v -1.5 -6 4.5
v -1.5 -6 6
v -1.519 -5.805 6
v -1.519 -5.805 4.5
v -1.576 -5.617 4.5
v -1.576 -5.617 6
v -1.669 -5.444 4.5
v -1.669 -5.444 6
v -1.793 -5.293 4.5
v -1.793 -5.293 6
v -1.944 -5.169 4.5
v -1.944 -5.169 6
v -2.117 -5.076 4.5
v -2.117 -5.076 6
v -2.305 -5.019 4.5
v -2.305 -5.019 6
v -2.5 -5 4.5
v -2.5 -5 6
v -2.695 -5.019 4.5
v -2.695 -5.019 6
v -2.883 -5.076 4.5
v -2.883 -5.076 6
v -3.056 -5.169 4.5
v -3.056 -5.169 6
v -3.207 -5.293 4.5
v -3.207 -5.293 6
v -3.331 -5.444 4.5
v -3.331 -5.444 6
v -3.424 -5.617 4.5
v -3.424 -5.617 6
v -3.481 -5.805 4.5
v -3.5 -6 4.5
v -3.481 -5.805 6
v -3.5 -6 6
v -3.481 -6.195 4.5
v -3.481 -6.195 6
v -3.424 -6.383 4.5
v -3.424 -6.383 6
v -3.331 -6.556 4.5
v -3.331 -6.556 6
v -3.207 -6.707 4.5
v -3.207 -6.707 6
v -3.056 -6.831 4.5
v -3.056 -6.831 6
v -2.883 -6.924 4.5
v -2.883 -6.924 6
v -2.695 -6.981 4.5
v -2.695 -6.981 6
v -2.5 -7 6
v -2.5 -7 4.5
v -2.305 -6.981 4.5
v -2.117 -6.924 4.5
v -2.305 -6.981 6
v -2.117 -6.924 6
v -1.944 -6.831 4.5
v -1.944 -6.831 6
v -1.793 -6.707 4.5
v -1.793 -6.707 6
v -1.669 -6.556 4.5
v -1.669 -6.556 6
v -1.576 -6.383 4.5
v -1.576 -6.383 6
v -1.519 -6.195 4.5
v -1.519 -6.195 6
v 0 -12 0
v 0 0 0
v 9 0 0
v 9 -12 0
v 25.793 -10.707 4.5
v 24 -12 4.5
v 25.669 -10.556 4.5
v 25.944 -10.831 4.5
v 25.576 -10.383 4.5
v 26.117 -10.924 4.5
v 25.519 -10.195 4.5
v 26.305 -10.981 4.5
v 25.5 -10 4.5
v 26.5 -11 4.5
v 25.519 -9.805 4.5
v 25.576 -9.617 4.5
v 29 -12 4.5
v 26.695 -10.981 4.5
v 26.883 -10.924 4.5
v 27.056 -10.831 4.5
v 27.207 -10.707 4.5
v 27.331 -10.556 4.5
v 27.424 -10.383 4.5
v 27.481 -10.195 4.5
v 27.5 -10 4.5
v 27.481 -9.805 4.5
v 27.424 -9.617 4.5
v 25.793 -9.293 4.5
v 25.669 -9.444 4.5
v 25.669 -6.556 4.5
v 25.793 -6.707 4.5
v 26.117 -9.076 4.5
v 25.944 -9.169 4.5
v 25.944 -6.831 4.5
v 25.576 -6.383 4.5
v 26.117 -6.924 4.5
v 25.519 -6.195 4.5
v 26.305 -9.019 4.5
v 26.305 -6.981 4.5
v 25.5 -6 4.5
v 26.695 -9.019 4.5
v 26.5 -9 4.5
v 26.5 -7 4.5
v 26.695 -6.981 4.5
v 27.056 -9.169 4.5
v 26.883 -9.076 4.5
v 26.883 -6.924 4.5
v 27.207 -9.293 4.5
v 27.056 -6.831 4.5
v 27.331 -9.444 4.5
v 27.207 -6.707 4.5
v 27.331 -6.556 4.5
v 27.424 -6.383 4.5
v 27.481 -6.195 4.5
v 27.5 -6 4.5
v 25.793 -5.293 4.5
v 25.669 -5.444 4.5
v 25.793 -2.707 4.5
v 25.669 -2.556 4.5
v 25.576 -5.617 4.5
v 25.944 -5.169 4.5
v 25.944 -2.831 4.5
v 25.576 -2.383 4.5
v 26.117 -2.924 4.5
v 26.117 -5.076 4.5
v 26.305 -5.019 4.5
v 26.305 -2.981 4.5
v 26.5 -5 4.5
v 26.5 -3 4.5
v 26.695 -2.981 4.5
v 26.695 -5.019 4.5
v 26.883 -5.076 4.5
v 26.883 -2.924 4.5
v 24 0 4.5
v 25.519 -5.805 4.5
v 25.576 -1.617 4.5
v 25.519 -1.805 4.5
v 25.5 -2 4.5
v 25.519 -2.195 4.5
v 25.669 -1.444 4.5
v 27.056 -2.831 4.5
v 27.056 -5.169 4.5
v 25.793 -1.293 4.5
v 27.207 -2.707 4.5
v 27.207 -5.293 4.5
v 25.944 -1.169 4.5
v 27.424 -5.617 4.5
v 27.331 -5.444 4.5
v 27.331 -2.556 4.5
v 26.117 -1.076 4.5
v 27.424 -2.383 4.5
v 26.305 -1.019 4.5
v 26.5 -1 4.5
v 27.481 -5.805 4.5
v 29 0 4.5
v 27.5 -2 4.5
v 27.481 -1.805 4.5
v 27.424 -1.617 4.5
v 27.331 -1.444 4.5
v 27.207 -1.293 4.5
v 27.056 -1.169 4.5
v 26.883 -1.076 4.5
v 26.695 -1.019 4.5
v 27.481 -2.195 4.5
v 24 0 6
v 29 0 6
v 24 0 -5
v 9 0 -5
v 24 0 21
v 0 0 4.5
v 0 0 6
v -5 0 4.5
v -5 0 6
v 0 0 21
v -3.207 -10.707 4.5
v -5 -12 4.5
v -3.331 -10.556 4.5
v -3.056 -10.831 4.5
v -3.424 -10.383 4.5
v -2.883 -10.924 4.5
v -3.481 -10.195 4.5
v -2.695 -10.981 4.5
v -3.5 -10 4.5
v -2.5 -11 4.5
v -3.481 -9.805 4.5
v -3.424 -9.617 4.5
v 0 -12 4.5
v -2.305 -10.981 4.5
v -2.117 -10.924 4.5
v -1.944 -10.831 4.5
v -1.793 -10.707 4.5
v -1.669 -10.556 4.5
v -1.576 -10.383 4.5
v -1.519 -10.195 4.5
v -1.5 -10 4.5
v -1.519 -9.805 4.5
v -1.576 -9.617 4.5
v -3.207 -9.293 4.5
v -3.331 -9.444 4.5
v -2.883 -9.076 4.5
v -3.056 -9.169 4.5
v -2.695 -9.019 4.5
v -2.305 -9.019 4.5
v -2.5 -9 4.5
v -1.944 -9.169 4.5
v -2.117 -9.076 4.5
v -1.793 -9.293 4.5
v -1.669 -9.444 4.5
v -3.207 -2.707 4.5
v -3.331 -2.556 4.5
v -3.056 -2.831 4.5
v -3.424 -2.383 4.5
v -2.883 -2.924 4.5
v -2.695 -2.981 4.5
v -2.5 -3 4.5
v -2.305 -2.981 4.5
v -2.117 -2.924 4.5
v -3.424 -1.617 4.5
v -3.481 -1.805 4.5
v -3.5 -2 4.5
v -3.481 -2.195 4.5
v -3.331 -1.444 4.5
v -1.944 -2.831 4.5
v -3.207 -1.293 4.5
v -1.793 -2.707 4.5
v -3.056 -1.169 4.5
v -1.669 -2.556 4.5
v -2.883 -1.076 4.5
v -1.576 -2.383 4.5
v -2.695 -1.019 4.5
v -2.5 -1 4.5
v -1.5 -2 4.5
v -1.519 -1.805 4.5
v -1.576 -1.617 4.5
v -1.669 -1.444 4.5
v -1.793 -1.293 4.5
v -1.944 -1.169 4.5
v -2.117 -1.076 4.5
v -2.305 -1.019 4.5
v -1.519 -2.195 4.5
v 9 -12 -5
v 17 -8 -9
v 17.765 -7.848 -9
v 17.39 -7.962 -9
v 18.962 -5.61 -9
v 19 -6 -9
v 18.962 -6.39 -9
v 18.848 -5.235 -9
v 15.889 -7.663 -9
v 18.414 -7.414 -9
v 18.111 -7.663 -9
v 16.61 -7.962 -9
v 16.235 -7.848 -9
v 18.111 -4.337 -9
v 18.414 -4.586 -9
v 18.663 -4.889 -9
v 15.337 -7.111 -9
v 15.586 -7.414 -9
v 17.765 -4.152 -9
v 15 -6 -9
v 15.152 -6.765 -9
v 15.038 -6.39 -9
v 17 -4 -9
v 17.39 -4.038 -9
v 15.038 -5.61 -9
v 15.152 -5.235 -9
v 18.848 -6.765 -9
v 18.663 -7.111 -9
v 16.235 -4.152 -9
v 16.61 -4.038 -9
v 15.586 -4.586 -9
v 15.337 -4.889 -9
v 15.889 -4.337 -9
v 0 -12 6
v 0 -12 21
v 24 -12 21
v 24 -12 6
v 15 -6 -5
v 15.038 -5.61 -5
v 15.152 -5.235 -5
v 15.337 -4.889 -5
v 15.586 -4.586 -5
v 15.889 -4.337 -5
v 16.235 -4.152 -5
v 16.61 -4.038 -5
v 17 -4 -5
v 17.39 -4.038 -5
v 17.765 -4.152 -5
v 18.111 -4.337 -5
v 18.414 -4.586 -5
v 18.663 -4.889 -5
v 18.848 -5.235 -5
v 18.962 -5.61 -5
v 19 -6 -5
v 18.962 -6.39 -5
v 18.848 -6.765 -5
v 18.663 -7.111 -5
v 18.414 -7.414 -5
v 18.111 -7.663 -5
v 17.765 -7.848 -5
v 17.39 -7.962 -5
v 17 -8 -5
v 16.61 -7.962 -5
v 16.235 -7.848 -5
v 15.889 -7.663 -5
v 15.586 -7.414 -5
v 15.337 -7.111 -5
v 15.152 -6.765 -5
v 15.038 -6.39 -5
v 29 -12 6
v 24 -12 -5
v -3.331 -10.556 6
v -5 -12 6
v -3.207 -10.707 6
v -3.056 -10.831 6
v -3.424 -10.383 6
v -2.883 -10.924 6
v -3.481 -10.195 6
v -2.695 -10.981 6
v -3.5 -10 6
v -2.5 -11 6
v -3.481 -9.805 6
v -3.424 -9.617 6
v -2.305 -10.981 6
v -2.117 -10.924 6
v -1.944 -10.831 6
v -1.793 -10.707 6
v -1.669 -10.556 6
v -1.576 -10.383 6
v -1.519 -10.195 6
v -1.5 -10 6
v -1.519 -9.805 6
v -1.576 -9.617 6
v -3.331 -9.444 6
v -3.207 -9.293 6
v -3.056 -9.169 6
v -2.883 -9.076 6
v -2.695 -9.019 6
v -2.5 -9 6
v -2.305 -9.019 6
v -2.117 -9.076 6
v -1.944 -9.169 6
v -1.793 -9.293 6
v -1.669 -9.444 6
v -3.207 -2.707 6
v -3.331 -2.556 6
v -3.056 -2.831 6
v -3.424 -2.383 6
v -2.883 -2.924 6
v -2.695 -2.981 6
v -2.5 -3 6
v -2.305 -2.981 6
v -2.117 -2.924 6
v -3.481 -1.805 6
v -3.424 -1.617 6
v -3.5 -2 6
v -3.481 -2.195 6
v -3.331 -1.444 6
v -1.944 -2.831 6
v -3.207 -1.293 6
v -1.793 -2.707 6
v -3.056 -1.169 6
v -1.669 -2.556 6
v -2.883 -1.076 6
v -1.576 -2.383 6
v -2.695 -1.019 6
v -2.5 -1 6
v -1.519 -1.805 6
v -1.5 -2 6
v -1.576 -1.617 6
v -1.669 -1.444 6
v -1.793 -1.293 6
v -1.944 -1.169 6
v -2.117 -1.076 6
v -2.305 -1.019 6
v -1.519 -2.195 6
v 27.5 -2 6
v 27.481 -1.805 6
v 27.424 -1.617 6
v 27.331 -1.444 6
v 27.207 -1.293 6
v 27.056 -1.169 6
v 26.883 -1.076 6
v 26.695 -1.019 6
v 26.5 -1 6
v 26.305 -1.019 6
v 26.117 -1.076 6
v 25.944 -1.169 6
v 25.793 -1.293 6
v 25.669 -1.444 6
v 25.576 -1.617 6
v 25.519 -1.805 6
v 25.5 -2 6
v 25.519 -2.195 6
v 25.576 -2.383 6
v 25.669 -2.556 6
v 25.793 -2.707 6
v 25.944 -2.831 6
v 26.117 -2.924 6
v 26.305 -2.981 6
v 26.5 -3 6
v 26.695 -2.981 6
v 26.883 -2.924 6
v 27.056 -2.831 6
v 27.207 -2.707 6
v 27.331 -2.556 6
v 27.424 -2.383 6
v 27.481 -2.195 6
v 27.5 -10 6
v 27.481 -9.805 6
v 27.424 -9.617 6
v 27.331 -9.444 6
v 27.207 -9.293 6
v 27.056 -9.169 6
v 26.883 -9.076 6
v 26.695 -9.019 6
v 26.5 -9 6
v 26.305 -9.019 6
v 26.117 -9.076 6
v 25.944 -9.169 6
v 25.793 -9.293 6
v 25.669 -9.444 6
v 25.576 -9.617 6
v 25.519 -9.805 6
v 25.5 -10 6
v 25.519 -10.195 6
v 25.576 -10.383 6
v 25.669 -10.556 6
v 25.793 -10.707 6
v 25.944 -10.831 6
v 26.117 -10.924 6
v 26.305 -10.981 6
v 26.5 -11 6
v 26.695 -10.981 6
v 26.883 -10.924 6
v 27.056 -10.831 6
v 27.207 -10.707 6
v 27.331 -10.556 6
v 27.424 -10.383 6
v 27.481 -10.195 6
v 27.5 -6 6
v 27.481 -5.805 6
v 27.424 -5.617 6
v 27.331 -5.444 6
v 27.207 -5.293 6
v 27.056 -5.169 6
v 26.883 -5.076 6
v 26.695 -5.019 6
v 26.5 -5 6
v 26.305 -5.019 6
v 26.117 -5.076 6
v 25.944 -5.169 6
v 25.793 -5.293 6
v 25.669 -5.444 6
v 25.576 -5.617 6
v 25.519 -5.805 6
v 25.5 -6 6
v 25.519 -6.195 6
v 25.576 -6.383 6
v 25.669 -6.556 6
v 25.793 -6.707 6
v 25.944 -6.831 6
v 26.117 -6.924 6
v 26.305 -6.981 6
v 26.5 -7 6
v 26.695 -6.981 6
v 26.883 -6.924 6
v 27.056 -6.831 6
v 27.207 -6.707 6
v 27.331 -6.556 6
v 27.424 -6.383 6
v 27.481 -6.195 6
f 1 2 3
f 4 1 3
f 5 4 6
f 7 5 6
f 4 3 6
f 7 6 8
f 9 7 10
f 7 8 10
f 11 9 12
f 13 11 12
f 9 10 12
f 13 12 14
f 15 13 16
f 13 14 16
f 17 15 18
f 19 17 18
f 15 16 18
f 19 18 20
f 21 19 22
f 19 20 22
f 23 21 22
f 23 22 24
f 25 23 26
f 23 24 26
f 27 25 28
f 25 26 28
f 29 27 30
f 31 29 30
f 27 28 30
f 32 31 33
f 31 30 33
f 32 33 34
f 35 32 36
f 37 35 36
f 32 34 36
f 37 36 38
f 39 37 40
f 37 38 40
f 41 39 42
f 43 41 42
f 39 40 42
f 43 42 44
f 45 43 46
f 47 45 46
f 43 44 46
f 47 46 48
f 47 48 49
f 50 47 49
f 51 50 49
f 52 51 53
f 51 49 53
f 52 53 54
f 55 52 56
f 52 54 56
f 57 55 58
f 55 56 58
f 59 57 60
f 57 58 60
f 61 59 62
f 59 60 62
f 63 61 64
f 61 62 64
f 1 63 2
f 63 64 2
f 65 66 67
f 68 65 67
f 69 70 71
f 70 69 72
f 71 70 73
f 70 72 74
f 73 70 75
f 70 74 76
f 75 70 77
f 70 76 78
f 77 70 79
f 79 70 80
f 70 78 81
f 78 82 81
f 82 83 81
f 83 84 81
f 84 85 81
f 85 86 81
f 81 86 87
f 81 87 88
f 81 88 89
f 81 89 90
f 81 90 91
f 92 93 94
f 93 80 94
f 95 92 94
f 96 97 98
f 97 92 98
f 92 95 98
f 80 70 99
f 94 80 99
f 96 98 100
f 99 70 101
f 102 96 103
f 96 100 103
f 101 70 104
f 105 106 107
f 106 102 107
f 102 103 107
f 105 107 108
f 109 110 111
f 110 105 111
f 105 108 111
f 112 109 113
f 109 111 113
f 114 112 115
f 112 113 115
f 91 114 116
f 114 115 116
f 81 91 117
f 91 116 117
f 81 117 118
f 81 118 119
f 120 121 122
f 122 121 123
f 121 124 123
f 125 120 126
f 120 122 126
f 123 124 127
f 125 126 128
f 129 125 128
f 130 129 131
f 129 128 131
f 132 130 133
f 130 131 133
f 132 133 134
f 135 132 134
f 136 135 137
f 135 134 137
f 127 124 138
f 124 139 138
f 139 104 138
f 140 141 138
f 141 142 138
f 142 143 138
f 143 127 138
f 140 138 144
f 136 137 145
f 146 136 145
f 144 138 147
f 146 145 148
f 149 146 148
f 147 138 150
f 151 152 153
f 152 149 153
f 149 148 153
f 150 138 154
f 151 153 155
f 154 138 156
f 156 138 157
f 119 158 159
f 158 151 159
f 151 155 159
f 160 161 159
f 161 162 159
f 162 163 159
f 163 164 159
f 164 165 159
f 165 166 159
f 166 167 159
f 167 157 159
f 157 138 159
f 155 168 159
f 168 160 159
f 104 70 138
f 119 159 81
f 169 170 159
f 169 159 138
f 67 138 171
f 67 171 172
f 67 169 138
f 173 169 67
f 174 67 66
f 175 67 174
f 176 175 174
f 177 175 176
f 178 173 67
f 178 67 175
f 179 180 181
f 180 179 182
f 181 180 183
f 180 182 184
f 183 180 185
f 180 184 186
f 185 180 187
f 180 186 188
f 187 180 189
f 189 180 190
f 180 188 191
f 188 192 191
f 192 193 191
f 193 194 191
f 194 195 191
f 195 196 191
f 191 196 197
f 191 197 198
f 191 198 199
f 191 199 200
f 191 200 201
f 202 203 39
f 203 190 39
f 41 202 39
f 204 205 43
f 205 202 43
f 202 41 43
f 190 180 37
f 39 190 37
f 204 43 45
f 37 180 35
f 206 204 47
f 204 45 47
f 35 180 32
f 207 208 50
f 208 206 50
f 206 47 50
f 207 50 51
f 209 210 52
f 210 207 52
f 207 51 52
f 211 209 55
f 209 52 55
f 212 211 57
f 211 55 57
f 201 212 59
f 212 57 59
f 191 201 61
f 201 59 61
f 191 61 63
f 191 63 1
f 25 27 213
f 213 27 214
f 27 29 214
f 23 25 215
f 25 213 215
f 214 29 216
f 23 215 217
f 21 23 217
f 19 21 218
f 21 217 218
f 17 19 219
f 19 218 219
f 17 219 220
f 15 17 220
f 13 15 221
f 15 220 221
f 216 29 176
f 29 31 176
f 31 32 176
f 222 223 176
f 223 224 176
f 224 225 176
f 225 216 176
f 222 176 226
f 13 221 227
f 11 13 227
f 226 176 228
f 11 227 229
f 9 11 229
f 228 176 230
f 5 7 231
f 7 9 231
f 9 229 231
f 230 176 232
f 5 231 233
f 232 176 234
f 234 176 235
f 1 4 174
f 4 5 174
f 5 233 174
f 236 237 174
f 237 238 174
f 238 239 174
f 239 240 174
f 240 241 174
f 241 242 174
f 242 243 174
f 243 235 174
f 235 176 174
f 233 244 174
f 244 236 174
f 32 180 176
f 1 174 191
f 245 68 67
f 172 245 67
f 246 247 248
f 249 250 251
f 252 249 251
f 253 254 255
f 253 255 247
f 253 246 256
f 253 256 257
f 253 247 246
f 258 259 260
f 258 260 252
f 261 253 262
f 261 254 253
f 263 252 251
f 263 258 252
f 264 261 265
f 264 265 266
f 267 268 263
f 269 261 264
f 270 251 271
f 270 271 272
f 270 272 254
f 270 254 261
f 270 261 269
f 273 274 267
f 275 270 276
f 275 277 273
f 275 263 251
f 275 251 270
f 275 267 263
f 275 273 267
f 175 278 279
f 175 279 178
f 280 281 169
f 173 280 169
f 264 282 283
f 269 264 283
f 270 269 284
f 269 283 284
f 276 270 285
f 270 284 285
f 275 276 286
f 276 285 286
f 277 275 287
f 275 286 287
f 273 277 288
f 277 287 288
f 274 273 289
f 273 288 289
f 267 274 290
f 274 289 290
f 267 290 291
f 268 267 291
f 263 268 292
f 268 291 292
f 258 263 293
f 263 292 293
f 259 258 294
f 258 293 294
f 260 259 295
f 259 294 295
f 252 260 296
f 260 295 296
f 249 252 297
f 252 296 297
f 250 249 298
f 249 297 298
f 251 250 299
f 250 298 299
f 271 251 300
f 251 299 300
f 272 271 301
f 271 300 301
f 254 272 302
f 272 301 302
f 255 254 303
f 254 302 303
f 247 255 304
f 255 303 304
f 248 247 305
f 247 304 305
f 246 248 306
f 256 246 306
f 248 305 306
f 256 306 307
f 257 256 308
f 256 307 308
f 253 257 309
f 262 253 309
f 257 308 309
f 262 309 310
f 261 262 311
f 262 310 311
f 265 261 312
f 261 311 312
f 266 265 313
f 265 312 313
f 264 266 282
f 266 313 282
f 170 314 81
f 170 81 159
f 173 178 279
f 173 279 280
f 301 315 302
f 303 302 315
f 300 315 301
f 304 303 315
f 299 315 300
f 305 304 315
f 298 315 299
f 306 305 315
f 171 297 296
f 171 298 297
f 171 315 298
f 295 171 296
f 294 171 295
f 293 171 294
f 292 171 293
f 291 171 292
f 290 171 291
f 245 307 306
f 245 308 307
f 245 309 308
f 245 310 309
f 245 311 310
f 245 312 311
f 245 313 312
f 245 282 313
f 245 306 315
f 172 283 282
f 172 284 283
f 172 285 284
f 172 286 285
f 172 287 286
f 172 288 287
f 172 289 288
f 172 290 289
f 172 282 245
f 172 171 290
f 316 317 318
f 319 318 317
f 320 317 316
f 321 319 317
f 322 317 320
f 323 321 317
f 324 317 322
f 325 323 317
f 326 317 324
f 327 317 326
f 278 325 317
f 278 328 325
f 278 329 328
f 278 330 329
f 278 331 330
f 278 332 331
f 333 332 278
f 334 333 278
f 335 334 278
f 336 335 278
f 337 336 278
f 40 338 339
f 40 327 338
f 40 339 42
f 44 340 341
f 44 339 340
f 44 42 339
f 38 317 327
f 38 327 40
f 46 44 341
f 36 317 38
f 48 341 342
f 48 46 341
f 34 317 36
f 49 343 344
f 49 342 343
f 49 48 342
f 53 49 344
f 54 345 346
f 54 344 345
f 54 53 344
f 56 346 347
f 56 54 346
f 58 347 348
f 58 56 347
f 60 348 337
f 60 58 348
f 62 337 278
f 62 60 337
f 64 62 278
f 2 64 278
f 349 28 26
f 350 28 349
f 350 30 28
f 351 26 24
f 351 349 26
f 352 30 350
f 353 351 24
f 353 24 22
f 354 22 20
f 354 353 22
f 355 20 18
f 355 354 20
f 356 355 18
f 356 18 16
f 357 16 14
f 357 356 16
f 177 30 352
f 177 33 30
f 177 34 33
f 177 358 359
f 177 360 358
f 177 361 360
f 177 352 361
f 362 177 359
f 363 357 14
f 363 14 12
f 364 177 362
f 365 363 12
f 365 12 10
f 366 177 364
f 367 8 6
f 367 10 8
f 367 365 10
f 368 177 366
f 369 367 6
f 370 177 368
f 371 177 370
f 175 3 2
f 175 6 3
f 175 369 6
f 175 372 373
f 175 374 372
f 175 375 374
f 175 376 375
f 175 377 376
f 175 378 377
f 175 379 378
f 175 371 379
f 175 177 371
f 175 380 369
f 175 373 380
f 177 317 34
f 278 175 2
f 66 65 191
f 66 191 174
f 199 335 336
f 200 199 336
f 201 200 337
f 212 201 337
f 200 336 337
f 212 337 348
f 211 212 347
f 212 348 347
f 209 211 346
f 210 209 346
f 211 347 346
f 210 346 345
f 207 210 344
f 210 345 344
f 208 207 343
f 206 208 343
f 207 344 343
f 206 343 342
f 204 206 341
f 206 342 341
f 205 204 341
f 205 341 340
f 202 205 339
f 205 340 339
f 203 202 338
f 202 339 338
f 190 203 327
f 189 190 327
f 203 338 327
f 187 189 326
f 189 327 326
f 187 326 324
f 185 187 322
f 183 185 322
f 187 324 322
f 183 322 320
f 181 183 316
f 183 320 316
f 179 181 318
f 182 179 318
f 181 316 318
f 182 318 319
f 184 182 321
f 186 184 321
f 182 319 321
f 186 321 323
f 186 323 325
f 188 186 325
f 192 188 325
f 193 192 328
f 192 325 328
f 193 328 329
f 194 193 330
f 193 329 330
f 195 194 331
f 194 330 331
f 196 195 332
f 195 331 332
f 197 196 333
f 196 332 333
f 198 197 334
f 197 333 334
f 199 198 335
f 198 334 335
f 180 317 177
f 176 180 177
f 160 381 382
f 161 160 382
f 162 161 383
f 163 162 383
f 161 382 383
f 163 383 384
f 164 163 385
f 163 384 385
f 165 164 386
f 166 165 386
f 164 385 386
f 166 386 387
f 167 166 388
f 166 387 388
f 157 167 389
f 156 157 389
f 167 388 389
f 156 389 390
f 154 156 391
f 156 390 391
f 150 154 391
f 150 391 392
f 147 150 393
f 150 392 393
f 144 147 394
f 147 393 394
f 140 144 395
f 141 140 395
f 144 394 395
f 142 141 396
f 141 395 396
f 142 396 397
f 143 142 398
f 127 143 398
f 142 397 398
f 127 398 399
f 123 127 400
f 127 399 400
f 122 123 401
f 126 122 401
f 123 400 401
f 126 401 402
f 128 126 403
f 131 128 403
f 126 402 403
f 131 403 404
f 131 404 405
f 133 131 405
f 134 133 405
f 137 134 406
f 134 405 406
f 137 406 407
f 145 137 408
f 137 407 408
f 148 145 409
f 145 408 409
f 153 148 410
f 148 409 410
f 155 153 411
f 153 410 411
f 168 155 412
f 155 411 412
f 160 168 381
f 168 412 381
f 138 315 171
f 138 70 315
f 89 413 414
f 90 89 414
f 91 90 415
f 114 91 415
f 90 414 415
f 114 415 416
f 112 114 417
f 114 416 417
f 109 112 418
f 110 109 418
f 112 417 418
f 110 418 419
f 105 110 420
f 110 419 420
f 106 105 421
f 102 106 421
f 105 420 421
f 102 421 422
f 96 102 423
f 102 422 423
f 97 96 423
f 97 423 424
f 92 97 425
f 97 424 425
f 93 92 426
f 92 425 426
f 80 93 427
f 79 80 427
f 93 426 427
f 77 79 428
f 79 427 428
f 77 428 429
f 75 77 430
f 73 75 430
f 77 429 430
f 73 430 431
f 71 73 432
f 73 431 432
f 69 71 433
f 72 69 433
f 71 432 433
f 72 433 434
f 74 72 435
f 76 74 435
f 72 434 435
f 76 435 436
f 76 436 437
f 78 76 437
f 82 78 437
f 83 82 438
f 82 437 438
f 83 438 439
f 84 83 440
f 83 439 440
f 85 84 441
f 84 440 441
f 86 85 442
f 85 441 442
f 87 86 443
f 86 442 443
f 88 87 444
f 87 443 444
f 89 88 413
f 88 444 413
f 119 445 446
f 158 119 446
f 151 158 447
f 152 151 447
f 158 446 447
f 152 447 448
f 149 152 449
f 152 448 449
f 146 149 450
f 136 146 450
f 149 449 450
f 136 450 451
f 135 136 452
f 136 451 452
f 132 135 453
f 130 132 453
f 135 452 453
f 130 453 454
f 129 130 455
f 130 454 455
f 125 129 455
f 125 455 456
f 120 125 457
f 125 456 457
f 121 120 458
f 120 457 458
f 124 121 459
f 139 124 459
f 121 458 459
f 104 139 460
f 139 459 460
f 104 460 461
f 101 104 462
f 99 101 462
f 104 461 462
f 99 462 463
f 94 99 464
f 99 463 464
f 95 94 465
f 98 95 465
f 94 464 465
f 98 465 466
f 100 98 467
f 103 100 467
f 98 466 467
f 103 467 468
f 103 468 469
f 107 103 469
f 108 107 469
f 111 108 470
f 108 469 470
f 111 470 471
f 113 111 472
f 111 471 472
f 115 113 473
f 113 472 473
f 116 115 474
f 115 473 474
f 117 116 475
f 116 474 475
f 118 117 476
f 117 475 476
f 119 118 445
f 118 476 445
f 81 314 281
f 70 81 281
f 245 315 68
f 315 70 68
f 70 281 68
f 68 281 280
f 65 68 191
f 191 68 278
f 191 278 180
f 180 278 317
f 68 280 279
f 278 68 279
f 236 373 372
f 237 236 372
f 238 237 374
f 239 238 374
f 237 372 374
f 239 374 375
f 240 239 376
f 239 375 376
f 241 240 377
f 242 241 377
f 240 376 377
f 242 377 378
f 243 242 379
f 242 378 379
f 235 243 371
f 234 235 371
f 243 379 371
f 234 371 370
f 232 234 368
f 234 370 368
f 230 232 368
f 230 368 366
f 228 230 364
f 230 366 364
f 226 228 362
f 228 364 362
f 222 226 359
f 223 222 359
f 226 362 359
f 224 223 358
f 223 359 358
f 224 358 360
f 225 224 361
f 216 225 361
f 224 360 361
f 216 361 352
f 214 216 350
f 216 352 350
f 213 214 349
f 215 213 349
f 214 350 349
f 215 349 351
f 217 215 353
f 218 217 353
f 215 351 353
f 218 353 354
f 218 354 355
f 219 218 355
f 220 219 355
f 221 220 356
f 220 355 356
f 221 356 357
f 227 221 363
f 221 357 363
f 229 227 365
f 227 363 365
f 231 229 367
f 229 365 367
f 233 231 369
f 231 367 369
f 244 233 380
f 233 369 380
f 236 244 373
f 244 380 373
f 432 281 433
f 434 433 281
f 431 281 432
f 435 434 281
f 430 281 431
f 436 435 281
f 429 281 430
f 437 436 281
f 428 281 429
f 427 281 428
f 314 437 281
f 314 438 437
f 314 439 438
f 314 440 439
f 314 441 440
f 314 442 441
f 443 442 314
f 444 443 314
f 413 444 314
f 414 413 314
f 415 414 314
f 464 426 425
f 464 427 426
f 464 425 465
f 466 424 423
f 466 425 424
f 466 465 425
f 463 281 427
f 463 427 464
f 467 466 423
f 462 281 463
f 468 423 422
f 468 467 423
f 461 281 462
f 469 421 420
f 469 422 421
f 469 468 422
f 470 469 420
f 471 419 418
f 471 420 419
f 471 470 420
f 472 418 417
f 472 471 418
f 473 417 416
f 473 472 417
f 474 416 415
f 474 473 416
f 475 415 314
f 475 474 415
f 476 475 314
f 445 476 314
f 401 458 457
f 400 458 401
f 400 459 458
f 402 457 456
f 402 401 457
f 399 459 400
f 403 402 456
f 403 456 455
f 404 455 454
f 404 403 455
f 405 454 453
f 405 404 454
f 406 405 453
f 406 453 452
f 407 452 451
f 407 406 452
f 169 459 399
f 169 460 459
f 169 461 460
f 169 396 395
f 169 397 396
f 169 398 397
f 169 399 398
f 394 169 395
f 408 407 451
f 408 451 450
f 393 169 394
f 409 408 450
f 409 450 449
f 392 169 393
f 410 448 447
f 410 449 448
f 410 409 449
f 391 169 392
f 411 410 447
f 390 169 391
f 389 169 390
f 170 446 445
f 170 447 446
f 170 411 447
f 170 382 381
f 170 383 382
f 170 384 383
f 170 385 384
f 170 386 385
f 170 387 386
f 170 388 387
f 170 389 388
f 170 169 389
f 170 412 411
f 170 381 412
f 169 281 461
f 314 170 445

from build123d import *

# Parameters (mm, degrees)
SKETCH1_W           = 24
SKETCH1_H           = 12
BOSS_EXTRUDE1_DEPTH = 21
SKETCH2_W           = 34
SKETCH2_H           = 12
SKETCH2_R           = 1
BOSS_EXTRUDE2_DEPTH = 1.5
SKETCH3_W           = 15
SKETCH3_H           = 12
BOSS_EXTRUDE3_DEPTH = 5
SKETCH4_R           = 2
BOSS_EXTRUDE4_DEPTH = 4


with BuildPart() as part:
    # Sketch1 → Boss-Extrude1 (new body)
    with BuildSketch(Plane.XY):
        with Locations((12, -6)):
            Rectangle(SKETCH1_W, SKETCH1_H)
    extrude(amount=BOSS_EXTRUDE1_DEPTH)

    # Sketch2 → Boss-Extrude2 (add)
    with BuildSketch(Plane.XY.offset(6)):
        with Locations((12, -6)):
            Rectangle(SKETCH2_W, SKETCH2_H)
        with Locations((-2.5, -2)):
            Circle(SKETCH2_R, mode=Mode.SUBTRACT)
        with Locations((26.5, -2)):
            Circle(SKETCH2_R, mode=Mode.SUBTRACT)
        with Locations((26.5, -6)):
            Circle(SKETCH2_R, mode=Mode.SUBTRACT)
        with Locations((26.5, -10)):
            Circle(SKETCH2_R, mode=Mode.SUBTRACT)
        with Locations((-2.5, -6)):
            Circle(SKETCH2_R, mode=Mode.SUBTRACT)
        with Locations((-2.5, -10)):
            Circle(SKETCH2_R, mode=Mode.SUBTRACT)
    extrude(amount=-BOSS_EXTRUDE2_DEPTH)

    # Sketch3 → Boss-Extrude3 (add)
    with BuildSketch(Plane(origin=(0, 0, 0), x_dir=(-1, 0, 0), z_dir=(0, 0, -1))):
        with Locations((-16.5, -6)):
            Rectangle(SKETCH3_W, SKETCH3_H)
    extrude(amount=BOSS_EXTRUDE3_DEPTH)

    # Sketch4 → Boss-Extrude4 (add)
    with BuildSketch(Plane(origin=(0, 0, -5), x_dir=(-1, 0, 0), z_dir=(0, 0, -1))):
        with Locations((-17, -6)):
            Circle(SKETCH4_R)
    extrude(amount=BOSS_EXTRUDE4_DEPTH)


solid = part.part
